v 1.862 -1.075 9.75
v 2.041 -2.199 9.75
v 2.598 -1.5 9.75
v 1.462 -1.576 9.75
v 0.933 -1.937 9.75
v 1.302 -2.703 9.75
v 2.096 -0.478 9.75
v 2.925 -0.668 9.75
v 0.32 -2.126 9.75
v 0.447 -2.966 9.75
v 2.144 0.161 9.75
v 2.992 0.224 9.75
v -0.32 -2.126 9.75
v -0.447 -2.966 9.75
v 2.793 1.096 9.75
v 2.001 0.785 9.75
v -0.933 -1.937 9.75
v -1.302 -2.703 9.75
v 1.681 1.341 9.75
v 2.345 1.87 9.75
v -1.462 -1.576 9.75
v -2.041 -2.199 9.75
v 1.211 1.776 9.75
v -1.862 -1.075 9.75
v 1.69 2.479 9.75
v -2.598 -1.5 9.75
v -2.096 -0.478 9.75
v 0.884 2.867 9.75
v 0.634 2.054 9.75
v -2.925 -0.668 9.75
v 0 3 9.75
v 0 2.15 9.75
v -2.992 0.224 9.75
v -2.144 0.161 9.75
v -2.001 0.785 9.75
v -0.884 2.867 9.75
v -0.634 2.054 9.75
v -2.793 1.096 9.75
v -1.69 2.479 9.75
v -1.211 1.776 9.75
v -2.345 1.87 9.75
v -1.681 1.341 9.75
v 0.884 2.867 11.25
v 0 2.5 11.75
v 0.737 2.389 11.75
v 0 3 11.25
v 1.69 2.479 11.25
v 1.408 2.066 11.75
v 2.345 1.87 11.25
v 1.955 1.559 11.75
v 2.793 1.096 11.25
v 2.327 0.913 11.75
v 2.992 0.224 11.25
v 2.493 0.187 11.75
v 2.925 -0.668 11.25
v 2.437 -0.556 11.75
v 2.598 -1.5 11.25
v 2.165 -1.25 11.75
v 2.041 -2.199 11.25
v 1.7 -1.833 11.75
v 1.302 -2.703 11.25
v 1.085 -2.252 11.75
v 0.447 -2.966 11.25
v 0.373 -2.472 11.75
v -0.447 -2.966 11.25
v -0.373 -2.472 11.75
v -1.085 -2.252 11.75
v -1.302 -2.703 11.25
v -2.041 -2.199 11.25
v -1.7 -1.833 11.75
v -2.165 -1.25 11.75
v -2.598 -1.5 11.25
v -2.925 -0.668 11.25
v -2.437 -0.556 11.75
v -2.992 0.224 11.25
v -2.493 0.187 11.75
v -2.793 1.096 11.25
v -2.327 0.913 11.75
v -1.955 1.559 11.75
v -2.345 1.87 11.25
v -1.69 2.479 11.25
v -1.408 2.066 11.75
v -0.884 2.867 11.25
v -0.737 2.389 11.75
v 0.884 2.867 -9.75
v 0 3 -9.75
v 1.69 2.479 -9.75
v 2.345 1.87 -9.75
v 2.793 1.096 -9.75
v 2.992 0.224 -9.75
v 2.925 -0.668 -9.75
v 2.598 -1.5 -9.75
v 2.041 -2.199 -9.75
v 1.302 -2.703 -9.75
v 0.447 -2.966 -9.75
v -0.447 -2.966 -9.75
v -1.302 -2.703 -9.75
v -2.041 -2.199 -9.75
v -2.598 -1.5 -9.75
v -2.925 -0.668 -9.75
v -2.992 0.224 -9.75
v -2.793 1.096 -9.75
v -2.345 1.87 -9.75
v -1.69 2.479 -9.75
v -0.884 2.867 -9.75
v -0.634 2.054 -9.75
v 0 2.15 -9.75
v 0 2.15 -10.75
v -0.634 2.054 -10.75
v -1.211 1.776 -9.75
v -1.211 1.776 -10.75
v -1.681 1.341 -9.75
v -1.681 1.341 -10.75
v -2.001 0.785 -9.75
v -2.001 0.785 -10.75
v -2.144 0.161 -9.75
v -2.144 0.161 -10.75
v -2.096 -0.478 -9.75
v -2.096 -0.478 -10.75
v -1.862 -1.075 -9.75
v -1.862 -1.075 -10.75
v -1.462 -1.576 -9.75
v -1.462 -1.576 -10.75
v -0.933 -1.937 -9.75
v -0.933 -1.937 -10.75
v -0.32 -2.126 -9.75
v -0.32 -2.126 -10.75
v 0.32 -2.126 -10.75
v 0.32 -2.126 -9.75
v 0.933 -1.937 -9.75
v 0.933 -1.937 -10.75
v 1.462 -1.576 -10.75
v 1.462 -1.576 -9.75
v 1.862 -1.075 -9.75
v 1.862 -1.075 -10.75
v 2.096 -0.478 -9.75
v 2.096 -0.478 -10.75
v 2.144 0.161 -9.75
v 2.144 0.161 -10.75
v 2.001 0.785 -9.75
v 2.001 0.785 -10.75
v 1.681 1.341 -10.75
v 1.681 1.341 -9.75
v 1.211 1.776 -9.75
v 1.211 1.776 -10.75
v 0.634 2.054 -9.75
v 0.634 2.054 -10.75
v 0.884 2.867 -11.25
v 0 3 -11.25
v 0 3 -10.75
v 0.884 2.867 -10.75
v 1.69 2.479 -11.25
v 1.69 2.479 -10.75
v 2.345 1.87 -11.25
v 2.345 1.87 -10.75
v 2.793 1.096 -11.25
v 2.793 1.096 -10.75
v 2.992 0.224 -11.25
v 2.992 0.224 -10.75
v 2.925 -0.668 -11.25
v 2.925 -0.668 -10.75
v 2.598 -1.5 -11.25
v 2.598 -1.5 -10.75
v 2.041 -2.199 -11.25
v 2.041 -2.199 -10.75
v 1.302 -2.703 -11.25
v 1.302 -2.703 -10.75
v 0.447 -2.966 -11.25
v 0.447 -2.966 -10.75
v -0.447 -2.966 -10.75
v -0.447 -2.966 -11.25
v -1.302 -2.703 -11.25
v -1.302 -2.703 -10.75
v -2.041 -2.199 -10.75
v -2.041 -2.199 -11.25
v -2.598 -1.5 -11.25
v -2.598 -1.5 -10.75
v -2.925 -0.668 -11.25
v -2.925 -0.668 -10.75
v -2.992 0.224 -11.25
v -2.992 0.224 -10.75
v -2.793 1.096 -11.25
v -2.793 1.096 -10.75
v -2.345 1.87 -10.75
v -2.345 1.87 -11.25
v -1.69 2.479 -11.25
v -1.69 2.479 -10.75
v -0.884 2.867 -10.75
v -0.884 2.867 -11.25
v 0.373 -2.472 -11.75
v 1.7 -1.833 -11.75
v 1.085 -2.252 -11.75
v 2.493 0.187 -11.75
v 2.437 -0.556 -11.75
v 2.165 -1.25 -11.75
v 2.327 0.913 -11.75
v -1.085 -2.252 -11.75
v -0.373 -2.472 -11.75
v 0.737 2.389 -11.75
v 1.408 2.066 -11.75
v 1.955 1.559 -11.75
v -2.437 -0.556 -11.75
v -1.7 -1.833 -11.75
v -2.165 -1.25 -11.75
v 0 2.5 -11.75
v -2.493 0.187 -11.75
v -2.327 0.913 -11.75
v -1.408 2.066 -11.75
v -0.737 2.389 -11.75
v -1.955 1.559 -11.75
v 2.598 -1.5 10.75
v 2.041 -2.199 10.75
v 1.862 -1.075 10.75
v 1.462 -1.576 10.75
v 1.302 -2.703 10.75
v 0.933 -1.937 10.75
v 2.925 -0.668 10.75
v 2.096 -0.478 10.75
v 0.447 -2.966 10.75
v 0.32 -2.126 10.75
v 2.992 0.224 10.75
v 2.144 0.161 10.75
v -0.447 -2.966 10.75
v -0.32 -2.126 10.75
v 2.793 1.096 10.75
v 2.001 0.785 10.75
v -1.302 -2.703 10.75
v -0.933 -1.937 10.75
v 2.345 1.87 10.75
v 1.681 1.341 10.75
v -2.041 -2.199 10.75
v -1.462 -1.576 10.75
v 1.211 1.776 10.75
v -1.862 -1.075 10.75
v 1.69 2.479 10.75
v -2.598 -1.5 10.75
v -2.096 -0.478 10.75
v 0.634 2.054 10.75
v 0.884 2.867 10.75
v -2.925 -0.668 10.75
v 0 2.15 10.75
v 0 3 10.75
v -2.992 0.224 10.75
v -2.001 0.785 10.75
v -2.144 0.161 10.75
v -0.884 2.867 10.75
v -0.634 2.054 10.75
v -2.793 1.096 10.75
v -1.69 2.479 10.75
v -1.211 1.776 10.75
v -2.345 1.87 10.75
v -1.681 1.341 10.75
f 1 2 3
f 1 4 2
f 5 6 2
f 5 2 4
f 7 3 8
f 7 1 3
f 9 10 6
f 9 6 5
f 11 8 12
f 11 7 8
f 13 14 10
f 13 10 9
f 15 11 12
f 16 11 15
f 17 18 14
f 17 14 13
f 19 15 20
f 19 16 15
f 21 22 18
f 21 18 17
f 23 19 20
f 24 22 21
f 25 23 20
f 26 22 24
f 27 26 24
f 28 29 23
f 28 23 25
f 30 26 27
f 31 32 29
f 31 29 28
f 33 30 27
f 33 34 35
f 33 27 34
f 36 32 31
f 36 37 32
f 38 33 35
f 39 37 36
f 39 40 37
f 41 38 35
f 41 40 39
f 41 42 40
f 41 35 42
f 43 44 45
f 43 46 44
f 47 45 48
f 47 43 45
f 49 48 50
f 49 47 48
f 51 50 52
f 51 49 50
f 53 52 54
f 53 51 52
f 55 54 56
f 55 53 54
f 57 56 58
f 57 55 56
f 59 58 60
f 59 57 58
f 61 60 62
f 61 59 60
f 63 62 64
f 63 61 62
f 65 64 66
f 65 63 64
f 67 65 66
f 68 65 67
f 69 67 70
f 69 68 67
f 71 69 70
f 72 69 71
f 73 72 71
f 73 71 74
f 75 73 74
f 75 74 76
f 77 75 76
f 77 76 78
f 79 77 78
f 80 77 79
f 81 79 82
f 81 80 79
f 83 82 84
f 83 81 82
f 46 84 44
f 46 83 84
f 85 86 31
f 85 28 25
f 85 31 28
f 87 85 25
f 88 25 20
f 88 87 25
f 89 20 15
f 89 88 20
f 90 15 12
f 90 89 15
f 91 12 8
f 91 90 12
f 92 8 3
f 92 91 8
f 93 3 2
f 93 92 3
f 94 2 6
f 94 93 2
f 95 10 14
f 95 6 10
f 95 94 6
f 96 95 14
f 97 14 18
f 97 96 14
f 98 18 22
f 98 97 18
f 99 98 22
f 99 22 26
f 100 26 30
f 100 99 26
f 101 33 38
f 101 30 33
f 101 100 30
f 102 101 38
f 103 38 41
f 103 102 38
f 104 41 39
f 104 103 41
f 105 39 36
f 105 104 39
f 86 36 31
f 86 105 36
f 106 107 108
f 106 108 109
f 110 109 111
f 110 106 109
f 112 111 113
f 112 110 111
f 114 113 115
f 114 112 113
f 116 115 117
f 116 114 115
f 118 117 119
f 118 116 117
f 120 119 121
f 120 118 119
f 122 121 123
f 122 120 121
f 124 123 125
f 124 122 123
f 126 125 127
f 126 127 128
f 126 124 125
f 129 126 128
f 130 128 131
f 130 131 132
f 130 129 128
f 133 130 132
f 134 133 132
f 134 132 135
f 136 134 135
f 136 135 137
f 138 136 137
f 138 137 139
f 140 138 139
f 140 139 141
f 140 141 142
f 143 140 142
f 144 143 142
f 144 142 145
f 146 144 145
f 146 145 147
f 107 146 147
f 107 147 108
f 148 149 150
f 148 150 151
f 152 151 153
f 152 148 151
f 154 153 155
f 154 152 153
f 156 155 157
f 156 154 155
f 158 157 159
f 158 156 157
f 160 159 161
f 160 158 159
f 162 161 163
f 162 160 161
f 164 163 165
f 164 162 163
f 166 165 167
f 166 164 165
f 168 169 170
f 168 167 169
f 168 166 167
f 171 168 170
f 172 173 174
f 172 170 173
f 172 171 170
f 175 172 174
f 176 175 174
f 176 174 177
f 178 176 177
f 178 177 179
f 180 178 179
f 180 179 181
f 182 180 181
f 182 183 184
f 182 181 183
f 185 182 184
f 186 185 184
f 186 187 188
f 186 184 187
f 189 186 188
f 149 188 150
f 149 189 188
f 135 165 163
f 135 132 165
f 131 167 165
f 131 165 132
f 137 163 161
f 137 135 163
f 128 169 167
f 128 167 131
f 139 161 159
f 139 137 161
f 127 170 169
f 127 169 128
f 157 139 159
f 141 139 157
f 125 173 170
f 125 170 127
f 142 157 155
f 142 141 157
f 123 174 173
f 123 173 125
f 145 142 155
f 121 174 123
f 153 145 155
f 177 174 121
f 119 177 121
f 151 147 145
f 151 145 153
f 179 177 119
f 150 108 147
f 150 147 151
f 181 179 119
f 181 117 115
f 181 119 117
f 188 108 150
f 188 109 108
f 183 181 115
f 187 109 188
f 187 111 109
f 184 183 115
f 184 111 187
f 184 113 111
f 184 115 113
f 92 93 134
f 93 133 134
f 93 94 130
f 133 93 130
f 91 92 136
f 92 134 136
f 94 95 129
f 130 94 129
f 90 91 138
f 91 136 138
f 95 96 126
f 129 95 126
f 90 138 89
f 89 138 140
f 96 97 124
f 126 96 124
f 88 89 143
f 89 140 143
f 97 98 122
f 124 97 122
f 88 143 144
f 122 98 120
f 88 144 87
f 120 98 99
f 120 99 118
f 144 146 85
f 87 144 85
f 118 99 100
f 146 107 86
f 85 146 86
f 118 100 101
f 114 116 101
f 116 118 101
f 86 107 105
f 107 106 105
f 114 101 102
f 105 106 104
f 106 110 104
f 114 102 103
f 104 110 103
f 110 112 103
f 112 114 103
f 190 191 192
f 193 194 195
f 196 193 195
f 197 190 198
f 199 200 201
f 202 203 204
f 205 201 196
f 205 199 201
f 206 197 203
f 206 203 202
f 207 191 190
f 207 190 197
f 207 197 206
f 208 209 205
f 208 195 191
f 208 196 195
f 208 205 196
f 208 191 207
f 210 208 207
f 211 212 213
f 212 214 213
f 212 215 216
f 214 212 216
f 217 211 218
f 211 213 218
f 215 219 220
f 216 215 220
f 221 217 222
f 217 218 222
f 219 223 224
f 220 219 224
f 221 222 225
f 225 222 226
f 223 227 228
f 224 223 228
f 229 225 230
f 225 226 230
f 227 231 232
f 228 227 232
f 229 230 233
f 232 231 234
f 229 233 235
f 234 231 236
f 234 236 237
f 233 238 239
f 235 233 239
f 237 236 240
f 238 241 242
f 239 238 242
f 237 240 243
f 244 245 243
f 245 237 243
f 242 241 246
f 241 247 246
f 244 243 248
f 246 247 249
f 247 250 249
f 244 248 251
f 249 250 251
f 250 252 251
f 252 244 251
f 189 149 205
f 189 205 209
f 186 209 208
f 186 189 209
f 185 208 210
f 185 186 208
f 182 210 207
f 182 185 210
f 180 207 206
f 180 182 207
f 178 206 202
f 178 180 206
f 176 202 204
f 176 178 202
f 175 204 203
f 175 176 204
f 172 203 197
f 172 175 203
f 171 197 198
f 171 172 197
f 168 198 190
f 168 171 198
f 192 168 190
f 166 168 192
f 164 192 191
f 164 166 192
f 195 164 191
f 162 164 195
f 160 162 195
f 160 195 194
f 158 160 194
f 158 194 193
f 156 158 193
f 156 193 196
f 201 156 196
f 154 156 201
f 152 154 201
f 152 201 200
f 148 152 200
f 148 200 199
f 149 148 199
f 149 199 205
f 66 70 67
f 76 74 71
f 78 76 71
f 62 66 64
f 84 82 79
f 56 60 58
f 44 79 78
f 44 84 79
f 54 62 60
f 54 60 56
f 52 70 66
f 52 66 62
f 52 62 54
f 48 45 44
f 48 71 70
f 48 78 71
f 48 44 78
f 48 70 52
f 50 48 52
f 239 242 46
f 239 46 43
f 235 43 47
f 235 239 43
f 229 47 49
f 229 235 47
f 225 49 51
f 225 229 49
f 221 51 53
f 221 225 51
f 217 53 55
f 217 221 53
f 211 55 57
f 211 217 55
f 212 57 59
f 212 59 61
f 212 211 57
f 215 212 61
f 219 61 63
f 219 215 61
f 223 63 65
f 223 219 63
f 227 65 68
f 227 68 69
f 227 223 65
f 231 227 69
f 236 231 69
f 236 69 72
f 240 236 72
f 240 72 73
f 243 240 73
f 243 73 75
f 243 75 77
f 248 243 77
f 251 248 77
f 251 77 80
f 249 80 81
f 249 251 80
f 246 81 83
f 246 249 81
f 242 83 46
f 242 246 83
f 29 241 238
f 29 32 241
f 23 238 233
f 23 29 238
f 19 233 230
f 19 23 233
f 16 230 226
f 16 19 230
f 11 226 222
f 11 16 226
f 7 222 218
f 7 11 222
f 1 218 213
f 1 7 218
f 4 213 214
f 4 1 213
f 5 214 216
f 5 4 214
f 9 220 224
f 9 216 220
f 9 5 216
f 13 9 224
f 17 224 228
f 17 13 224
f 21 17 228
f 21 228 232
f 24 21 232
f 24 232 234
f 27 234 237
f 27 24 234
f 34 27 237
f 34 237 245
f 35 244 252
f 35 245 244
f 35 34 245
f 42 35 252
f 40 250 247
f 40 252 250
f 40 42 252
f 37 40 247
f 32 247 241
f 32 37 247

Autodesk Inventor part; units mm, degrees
ref_plane "YZ Plane" through (0, 0, 0) normal (1, 0, 0) x (0, 1, 0)
ref_plane "XZ Plane" through (0, 0, 0) normal (0, 1, 0) x (-1, 0, 0)
ref_plane "XY Plane" through (0, 0, 0) normal (0, 0, 1) x (1, 0, 0)
sketch "Sketch1" plane through (0, 0, 0) normal (1, 0, 0) x (0, 1, 0)
  line L0 (0, -12) -> (3, -12)
  line L1 (3, 12) -> (0, 12)
  line L2 (0, 12) -> (0, -12)
  line L3 (3, 9) -> (3, -9)
  line L4 (3, 0) -> (0, 0)
  line L5 (0, -9.75) -> (0, 9.75)
  line L6 (3, 9.75) -> (3, -9.75)
  line L7 (3, 10.75) -> (2.15, 10.75)
  line L8 (2.15, 10.75) -> (2.15, 9.75)
  line L9 (3, 12) -> (3, 10.75)
  line L10 (2.15, 9.75) -> (3, 9.75)
  line L11 (3, -10.75) -> (2.15, -10.75)
  line L12 (2.15, -10.75) -> (2.15, -9.75)
  line L13 (2.15, -9.75) -> (3, -9.75)
  line L14 (3, -10.75) -> (3, -12)
  line L15 (0, -16.8) -> (0, 16.8) projected
  point P0 (1.5, 0)
  dimension "d12" = 19.5
  dimension "d13" = 1
  dimension "d14" = 0.85
  dimension "d16" = 1
revolve "Revolution1" add sketch "Sketch1" angle 360 about axis through (0, 0, -10) along (0, 0, 1)
sketch "Sketch2" plane through (0, 0, 12) normal (0, 0, 1) x (1, 0, 0)
  circle A0 centre (0, 0) radius 3 projected
extrude "Extrusion1" cut sketch "Sketch2" against normal blind 0.25
sketch "Sketch3" plane through (0, 0, -12) normal (0, 0, -1) x (-1, 0, 0)
  circle A0 centre (0, 0) radius 3 projected
extrude "Extrusion2" cut sketch "Sketch3" against normal blind 0.25
chamfer "Chamfer1" distance 0.5 angle 45 2 edges at (0, -3, -11.75) (0, -3, 11.75)
properties part number "hridelka1"
